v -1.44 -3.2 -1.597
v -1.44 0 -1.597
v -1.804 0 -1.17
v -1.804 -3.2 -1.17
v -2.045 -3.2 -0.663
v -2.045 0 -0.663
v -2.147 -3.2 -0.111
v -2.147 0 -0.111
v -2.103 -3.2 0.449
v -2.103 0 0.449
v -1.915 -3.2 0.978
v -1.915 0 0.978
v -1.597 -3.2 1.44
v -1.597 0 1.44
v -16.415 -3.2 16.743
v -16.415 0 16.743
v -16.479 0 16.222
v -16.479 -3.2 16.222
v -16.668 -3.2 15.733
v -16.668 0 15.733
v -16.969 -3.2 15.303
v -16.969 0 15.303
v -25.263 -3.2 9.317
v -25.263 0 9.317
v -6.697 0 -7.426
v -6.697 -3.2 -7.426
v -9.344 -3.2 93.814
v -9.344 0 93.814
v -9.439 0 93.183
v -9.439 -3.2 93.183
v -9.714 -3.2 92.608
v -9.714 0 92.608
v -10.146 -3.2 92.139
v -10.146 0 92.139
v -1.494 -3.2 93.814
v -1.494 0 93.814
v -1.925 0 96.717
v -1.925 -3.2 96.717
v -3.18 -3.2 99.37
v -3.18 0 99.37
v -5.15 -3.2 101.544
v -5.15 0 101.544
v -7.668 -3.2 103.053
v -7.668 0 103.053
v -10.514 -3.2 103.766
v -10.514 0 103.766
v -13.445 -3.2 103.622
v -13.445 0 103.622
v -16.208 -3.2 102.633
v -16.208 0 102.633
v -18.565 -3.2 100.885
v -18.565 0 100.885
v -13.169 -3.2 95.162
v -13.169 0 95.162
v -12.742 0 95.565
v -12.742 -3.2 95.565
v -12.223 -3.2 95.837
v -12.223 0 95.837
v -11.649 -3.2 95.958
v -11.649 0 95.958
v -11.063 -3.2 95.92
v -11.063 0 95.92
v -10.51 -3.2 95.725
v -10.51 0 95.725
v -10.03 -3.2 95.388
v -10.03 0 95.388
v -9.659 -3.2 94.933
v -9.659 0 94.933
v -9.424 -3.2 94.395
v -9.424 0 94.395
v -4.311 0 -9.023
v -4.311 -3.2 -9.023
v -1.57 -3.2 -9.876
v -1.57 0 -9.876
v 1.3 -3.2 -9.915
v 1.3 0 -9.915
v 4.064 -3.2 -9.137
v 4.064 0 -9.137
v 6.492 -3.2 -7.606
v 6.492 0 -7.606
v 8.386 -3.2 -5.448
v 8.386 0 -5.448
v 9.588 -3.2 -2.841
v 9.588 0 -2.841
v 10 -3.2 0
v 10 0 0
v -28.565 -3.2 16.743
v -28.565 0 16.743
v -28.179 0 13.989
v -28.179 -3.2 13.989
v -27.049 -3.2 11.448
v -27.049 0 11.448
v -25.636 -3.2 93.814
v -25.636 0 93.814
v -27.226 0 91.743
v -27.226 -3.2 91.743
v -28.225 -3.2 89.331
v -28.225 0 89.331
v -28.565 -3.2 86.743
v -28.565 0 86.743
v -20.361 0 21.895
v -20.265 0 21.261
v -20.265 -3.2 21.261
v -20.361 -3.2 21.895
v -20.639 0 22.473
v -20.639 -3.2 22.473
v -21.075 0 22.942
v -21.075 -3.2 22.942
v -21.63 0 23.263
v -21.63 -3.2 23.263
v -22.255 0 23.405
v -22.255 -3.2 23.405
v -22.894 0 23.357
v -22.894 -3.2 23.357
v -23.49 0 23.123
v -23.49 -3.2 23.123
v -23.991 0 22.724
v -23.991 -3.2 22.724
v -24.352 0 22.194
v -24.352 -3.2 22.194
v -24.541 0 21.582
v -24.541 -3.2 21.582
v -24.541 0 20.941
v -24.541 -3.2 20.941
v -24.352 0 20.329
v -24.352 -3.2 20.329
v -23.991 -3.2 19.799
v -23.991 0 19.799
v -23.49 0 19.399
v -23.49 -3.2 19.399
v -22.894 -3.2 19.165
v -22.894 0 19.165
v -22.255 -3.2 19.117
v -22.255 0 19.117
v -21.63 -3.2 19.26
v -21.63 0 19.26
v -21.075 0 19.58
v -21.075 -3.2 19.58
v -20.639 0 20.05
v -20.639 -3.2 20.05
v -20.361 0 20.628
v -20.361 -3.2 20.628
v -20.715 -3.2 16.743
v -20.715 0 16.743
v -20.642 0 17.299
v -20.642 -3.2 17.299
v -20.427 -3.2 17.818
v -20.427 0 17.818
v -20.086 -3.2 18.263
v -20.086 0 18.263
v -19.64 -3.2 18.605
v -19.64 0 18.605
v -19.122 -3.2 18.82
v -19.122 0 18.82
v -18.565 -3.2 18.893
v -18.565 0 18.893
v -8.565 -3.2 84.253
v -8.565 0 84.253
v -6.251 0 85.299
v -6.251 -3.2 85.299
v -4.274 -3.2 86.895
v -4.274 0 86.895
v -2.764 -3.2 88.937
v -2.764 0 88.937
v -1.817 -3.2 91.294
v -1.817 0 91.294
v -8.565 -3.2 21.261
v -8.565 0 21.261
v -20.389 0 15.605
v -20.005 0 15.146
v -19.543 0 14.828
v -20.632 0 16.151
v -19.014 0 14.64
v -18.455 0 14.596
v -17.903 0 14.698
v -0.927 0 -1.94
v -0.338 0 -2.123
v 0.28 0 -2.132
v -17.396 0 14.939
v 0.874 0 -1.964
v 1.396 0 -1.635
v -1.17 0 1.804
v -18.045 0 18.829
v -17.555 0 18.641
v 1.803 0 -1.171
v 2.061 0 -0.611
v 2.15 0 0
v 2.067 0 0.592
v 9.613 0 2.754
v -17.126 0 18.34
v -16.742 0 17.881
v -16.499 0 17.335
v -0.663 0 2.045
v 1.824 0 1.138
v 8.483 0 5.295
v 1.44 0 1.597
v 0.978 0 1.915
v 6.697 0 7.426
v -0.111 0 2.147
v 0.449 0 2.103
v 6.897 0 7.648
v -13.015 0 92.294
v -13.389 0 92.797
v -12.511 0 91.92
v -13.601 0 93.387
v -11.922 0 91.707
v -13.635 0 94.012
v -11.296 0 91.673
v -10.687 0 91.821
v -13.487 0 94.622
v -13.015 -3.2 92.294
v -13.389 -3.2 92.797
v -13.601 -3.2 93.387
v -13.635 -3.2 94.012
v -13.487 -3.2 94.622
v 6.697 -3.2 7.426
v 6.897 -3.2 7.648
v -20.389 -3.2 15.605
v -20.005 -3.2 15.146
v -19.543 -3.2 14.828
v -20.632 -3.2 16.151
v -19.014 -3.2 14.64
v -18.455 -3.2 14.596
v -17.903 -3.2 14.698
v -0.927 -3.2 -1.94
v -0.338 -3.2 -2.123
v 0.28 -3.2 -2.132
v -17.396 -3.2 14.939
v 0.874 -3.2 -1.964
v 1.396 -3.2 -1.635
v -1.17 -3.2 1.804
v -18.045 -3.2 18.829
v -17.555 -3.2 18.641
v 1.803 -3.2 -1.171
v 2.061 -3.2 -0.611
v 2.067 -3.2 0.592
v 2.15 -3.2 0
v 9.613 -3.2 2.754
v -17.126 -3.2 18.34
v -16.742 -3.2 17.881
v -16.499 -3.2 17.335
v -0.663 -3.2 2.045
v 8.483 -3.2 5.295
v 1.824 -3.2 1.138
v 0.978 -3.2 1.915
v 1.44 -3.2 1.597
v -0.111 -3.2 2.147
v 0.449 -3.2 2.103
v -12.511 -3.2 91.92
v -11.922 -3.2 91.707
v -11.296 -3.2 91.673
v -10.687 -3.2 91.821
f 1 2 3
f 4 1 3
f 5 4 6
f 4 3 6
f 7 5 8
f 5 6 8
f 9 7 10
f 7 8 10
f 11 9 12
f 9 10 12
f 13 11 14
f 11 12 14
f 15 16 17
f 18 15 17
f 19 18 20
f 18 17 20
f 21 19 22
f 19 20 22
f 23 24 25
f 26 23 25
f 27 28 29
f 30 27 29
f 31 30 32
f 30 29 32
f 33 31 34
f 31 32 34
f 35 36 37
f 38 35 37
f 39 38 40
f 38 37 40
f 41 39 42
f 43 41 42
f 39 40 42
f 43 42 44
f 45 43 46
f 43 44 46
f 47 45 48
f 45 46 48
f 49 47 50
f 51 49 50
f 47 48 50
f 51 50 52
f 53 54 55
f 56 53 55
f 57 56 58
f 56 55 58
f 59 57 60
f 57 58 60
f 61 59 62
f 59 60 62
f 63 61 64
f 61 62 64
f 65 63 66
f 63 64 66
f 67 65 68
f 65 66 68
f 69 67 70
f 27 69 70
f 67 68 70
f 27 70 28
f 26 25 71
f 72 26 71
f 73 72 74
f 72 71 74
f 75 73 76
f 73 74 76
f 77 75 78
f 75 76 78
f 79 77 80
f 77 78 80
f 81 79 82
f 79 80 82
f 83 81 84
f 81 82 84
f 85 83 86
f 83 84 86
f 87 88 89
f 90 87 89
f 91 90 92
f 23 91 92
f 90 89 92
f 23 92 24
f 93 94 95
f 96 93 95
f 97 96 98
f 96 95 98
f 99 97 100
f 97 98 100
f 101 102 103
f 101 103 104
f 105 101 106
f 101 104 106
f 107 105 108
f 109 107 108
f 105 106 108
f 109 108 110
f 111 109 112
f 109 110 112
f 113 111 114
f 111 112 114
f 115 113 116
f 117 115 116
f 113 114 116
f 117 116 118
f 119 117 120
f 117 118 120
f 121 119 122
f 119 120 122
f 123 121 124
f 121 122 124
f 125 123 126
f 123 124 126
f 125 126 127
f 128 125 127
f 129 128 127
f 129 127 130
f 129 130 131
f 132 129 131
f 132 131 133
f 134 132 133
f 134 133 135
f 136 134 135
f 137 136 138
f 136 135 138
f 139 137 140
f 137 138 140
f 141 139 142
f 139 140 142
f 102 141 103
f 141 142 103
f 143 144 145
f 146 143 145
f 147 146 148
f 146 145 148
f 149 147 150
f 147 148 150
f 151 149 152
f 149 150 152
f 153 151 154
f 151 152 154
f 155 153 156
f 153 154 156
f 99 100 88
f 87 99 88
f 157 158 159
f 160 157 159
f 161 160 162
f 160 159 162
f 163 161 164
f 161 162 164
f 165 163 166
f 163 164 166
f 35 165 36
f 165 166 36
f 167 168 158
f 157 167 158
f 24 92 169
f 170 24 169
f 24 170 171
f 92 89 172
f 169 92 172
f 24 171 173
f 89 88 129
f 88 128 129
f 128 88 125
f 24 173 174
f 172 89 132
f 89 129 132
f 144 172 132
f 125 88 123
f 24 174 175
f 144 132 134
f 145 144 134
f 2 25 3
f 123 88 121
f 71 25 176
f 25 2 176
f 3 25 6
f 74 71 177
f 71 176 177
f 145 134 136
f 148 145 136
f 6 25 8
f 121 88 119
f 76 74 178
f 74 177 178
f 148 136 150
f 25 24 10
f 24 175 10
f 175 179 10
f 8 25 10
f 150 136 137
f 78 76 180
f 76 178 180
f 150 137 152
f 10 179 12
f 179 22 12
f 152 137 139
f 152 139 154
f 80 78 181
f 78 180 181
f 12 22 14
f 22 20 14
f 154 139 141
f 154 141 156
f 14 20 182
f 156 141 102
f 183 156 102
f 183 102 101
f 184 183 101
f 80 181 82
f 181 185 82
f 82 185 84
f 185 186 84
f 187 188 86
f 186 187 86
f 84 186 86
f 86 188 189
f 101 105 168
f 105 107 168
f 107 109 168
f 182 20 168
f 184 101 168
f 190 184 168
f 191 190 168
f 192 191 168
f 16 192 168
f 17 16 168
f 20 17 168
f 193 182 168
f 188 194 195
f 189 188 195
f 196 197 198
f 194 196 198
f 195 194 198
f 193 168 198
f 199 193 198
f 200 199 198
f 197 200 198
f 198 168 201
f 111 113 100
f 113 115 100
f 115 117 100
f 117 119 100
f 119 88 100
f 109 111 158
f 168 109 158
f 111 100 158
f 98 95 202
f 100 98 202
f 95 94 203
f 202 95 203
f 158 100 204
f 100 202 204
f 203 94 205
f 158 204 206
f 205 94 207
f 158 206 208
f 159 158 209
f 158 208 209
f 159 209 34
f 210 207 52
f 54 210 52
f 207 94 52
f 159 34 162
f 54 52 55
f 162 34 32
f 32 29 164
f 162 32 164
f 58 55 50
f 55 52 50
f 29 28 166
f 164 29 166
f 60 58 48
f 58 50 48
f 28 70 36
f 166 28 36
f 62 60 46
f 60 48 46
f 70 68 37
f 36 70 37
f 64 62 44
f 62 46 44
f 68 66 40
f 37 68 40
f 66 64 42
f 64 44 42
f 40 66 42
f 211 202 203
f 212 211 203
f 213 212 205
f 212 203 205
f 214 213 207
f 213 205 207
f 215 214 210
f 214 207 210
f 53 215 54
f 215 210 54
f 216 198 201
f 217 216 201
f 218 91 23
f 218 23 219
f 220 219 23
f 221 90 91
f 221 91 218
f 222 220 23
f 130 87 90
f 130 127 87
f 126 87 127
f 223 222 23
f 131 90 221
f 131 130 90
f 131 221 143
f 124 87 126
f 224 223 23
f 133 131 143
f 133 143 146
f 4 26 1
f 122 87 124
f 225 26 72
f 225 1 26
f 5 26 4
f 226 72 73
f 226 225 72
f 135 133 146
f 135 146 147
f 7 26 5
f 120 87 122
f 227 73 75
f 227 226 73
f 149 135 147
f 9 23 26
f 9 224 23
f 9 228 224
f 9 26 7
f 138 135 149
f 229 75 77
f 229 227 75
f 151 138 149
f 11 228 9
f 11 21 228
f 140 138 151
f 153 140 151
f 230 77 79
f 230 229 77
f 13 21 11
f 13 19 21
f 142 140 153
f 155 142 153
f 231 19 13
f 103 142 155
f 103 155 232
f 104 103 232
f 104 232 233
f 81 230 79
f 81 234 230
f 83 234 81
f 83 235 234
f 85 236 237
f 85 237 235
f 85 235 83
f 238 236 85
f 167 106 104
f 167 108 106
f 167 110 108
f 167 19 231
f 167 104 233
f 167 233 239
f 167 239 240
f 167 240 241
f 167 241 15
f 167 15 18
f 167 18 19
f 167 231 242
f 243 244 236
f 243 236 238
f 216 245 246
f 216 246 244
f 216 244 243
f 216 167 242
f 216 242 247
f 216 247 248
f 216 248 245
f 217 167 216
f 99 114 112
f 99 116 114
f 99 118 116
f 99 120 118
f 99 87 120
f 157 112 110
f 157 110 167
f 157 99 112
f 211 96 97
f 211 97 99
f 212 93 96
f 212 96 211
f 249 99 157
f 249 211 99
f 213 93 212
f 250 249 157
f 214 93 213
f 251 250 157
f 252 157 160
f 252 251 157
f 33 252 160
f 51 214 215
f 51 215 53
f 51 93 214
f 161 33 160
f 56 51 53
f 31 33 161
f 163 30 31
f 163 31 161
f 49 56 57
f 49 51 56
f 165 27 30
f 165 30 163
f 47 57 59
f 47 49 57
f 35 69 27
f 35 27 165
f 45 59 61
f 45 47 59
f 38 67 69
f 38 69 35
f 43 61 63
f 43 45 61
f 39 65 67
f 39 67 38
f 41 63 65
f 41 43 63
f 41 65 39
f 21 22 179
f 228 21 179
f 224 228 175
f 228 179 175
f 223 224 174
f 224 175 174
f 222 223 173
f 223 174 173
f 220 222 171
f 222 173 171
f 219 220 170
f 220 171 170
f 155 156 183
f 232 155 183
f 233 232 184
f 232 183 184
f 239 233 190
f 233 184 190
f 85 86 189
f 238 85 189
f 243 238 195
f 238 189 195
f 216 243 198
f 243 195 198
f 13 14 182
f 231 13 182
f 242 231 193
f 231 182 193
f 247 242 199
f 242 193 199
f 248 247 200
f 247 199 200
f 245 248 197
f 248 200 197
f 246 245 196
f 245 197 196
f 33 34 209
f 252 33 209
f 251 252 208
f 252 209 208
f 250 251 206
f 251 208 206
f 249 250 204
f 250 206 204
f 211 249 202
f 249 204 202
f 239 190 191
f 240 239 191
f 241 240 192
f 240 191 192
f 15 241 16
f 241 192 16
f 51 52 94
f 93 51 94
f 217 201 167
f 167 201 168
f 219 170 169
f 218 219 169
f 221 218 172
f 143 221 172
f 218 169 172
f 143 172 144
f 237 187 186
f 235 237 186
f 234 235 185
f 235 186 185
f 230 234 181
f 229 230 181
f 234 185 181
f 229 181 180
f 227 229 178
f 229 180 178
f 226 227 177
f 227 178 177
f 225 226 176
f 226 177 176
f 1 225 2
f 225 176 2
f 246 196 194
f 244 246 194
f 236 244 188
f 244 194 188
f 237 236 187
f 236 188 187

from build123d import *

# Parameters (mm, degrees)
F1_DEPTH = 3.2
F2_R     = 2.15
F3_DEPTH = 12.5


with BuildPart() as f1:
    # F0 (on Front) → F1 (new body)
    with BuildSketch(Plane.XZ):
        with BuildLine():
            Line((-18.5654132097, 100.885057482), (-25.6364810216, 93.8139896702))
            ThreePointArc((-25.6364810216, 93.8139896702), (-23.5654132097, 95.4031758961), (-21.1536036607, 96.4021801212))
            ThreePointArc((-21.1536036607, 96.4021801212), (-20.1545994357, 98.8139896702), (-18.5654132097, 100.885057482))
        make_face()
        with BuildLine():
            ThreePointArc((-6.6971687433, -7.4261652839), (-9.9867052636, -0.5154783973), (-7.4261652839, 6.6971687433))
            Line((-7.4261652839, 6.6971687433), (-11.1392479258, 10.045753115))
            ThreePointArc((-11.1392479258, 10.045753115), (-18.0499348124, 6.7562165947), (-25.262581953, 9.3167565744))
            Line((-25.262581953, 9.3167565744), (-6.6971687433, -7.4261652839))
        make_face()
        with BuildLine():
            Line((-28.5654132097, 86.7429218583), (-28.5654132097, 16.7429218583))
            ThreePointArc((-28.5654132097, 16.7429218583), (-25.6364810216, 23.8139896702), (-18.5654132097, 26.7429218583))
            Line((-18.5654132097, 26.7429218583), (-18.5654132097, 76.7429218583))
            ThreePointArc((-18.5654132097, 76.7429218583), (-25.6364810216, 79.6718540464), (-28.5654132097, 86.7429218583))
        make_face()
        with BuildLine():
            Line((-18.5654132097, 86.7429218583), (-28.5654132097, 86.7429218583))
            ThreePointArc((-28.5654132097, 86.7429218583), (-25.6364810216, 79.6718540464), (-18.5654132097, 76.7429218583))
            Line((-18.5654132097, 76.7429218583), (-18.5654132097, 86.7429218583))
        make_face()
        with BuildLine():
            ThreePointArc((-25.6364810216, 93.8139896702), (-27.8042085348, 90.5697561819), (-28.5654132097, 86.7429218583))
            Line((-28.5654132097, 86.7429218583), (-18.5654132097, 86.7429218583))
            ThreePointArc((-18.5654132097, 86.7429218583), (-21.1536036607, 91.2257992191), (-21.1536036607, 96.4021801212))
            ThreePointArc((-21.1536036607, 96.4021801212), (-23.5654132097, 95.4031758961), (-25.6364810216, 93.8139896702))
        make_face()
        with BuildLine():
            ThreePointArc((-8.9061549468, 84.1547314073), (-8.7353506369, 84.2021247154), (-8.5654132097, 84.2525380943))
            Line((-8.5654132097, 84.2525380943), (-8.5654132097, 86.7429218583))
            ThreePointArc((-8.5654132097, 86.7429218583), (-8.650964596, 85.4376599361), (-8.9061549468, 84.1547314073))
        make_face()
        with BuildLine():
            ThreePointArc((-11.8682444664, 24.1690871422), (-9.4283543987, 20.8066832051), (-8.5654132097, 16.7429218583))
            Line((-8.5654132097, 16.7429218583), (-8.5654132097, 21.2613671129))
            Line((-8.5654132097, 21.2613671129), (-11.8682444664, 24.1690871422))
        make_face()
        with BuildLine():
            ThreePointArc((-28.5654132097, 16.7429218583), (-27.7024720208, 12.6791605115), (-25.262581953, 9.3167565744))
            Line((-25.262581953, 9.3167565744), (-20.0053044895, 15.1462963223))
            ThreePointArc((-20.0053044895, 15.1462963223), (-20.5298808541, 15.8692131687), (-20.7154132097, 16.7429218583))
            Line((-20.7154132097, 16.7429218583), (-28.5654132097, 16.7429218583))
        make_face()
        with BuildLine():
            Line((6.6971687433, 7.4261652839), (1.4398912798, 1.596625536))
            ThreePointArc((1.4398912798, 1.596625536), (1.9644676444, 0.8737086896), (2.15, 0))
            ThreePointArc((2.15, 0), (0.8737086896, -1.9644676444), (-1.4398912798, -1.596625536))
            Line((-1.4398912798, -1.596625536), (-6.6971687433, -7.4261652839))
            ThreePointArc((-6.6971687433, -7.4261652839), (4.0637613468, -9.1370588111), (10, 0))
            ThreePointArc((10, 0), (9.1370588111, 4.0637613468), (6.6971687433, 7.4261652839))
        make_face()
        with BuildLine():
            Line((-7.4261652839, 6.6971687433), (-1.596625536, 1.4398912798))
            ThreePointArc((-1.596625536, 1.4398912798), (-0.1108278554, 2.1471416317), (1.4398912798, 1.596625536))
            Line((1.4398912798, 1.596625536), (6.6971687433, 7.4261652839))
            ThreePointArc((6.6971687433, 7.4261652839), (-0.5154783973, 9.9867052636), (-7.4261652839, 6.6971687433))
        make_face()
        with BuildLine():
            ThreePointArc((-1.4398912798, -1.596625536), (-2.1471416317, -0.1108278554), (-1.596625536, 1.4398912798))
            Line((-1.596625536, 1.4398912798), (-7.4261652839, 6.6971687433))
            ThreePointArc((-7.4261652839, 6.6971687433), (-9.9867052636, -0.5154783973), (-6.6971687433, -7.4261652839))
            Line((-6.6971687433, -7.4261652839), (-1.4398912798, -1.596625536))
        make_face()
        with BuildLine():
            Line((-11.1392479258, 10.045753115), (-7.4261652839, 6.6971687433))
            ThreePointArc((-7.4261652839, 6.6971687433), (-0.5154783973, 9.9867052636), (6.6971687433, 7.4261652839))
            Line((6.6971687433, 7.4261652839), (6.8974743638, 7.6482744619))
            Line((6.8974743638, 7.6482744619), (-8.5654132097, 21.2613671129))
            Line((-8.5654132097, 21.2613671129), (-8.5654132097, 16.7429218583))
            ThreePointArc((-8.5654132097, 16.7429218583), (-9.2310237589, 13.1555588183), (-11.1392479258, 10.045753115))
        make_face()
        with BuildLine():
            ThreePointArc((-25.262581953, 9.3167565744), (-18.0499348124, 6.7562165947), (-11.1392479258, 10.045753115))
            Line((-11.1392479258, 10.045753115), (-16.9687876737, 15.3030305785))
            ThreePointArc((-16.9687876737, 15.3030305785), (-18.4545853543, 14.5957802266), (-20.0053044895, 15.1462963223))
            Line((-20.0053044895, 15.1462963223), (-25.262581953, 9.3167565744))
        make_face()
        with BuildLine():
            ThreePointArc((-18.5654132097, 26.7429218583), (-25.6364810216, 23.8139896702), (-28.5654132097, 16.7429218583))
            Line((-28.5654132097, 16.7429218583), (-20.7154132097, 16.7429218583))
            ThreePointArc((-20.7154132097, 16.7429218583), (-20.0856927893, 18.2632014378), (-18.5654132097, 18.8929218583))
            Line((-18.5654132097, 18.8929218583), (-18.5654132097, 26.7429218583))
        make_face()
        with BuildLine():
            Line((-8.5654132097, 86.7429218583), (-8.5654132097, 84.2525380943))
            ThreePointArc((-8.5654132097, 84.2525380943), (-3.4541550431, 87.8679540951), (-1.4943453978, 93.8139896702))
            ThreePointArc((-1.4943453978, 93.8139896702), (-7.6675110742, 103.0527849953), (-18.5654132097, 100.885057482))
            ThreePointArc((-18.5654132097, 100.885057482), (-20.1545994357, 98.8139896702), (-21.1536036607, 96.4021801212))
            ThreePointArc((-21.1536036607, 96.4021801212), (-17.030591367, 96.624436009), (-13.1692451405, 95.1620293032))
            ThreePointArc((-13.1692451405, 95.1620293032), (-10.7796896928, 95.8417389701), (-9.3443453978, 93.8139896702))
            ThreePointArc((-9.3443453978, 93.8139896702), (-9.5551722221, 92.8854922849), (-10.1463057648, 92.1390899275))
            ThreePointArc((-10.1463057648, 92.1390899275), (-8.9687712332, 89.5544095029), (-8.5654132097, 86.7429218583))
        make_face()
        with BuildLine():
            Line((-11.8682444664, 24.1690871422), (-8.5654132097, 21.2613671129))
            Line((-8.5654132097, 21.2613671129), (-8.5654132097, 84.2525380943))
            ThreePointArc((-8.5654132097, 84.2525380943), (-8.7353506369, 84.2021247154), (-8.9061549468, 84.1547314073))
            ThreePointArc((-8.9061549468, 84.1547314073), (-12.4777989196, 78.8093884554), (-18.5654132097, 76.7429218583))
            Line((-18.5654132097, 76.7429218583), (-18.5654132097, 26.7429218583))
            ThreePointArc((-18.5654132097, 26.7429218583), (-14.9780501697, 26.0773113091), (-11.8682444664, 24.1690871422))
        make_face()
        with BuildLine():
            Line((-17.1255219299, 18.3395473943), (-11.8682444664, 24.1690871422))
            ThreePointArc((-11.8682444664, 24.1690871422), (-14.9780501697, 26.0773113091), (-18.5654132097, 26.7429218583))
            Line((-18.5654132097, 26.7429218583), (-18.5654132097, 18.8929218583))
            ThreePointArc((-18.5654132097, 18.8929218583), (-17.7941301561, 18.7498155902), (-17.1255219299, 18.3395473943))
        make_face()
        with BuildLine():
            Line((-16.4154132097, 16.7429218583), (-8.5654132097, 16.7429218583))
            ThreePointArc((-8.5654132097, 16.7429218583), (-9.4283543987, 20.8066832051), (-11.8682444664, 24.1690871422))
            Line((-11.8682444664, 24.1690871422), (-17.1255219299, 18.3395473943))
            ThreePointArc((-17.1255219299, 18.3395473943), (-16.6009455653, 17.6166305478), (-16.4154132097, 16.7429218583))
        make_face()
        with BuildLine():
            Line((-16.9687876737, 15.3030305785), (-11.1392479258, 10.045753115))
            ThreePointArc((-11.1392479258, 10.045753115), (-9.2310237589, 13.1555588183), (-8.5654132097, 16.7429218583))
            Line((-8.5654132097, 16.7429218583), (-16.4154132097, 16.7429218583))
            ThreePointArc((-16.4154132097, 16.7429218583), (-16.5585194778, 15.9716388047), (-16.9687876737, 15.3030305785))
        make_face()
        with BuildLine():
            ThreePointArc((-21.1536036607, 96.4021801212), (-21.1536036607, 91.2257992191), (-18.5654132097, 86.7429218583))
            Line((-18.5654132097, 86.7429218583), (-13.0146249774, 92.2937100906))
            ThreePointArc((-13.0146249774, 92.2937100906), (-13.6412283712, 93.6982593867), (-13.1692451405, 95.1620293032))
            ThreePointArc((-13.1692451405, 95.1620293032), (-17.030591367, 96.624436009), (-21.1536036607, 96.4021801212))
        make_face()
        with BuildLine():
            Line((-18.5654132097, 86.7429218583), (-8.5654132097, 86.7429218583))
            ThreePointArc((-8.5654132097, 86.7429218583), (-8.9687712332, 89.5544095029), (-10.1463057648, 92.1390899275))
            ThreePointArc((-10.1463057648, 92.1390899275), (-11.6100756813, 91.6671066968), (-13.0146249774, 92.2937100906))
            Line((-13.0146249774, 92.2937100906), (-18.5654132097, 86.7429218583))
        make_face()
        with BuildLine():
            ThreePointArc((-18.5654132097, 76.7429218583), (-12.4777989196, 78.8093884554), (-8.9061549468, 84.1547314073))
            ThreePointArc((-8.9061549468, 84.1547314073), (-14.0825358489, 84.1547314073), (-18.5654132097, 86.7429218583))
            Line((-18.5654132097, 86.7429218583), (-18.5654132097, 76.7429218583))
        make_face()
        with BuildLine():
            ThreePointArc((-8.9061549468, 84.1547314073), (-8.650964596, 85.4376599361), (-8.5654132097, 86.7429218583))
            Line((-8.5654132097, 86.7429218583), (-18.5654132097, 86.7429218583))
            ThreePointArc((-18.5654132097, 86.7429218583), (-14.0825358489, 84.1547314073), (-8.9061549468, 84.1547314073))
        make_face()
    extrude(amount=F1_DEPTH)

    # F2 (on Front) → F3 (cut, symmetric)
    with BuildSketch(Plane.XZ):
        with Locations((-22.4154132097, 21.2613671129)):
            Circle(F2_R)
    extrude(amount=F3_DEPTH, both=True, mode=Mode.SUBTRACT)


solid = f1.part
